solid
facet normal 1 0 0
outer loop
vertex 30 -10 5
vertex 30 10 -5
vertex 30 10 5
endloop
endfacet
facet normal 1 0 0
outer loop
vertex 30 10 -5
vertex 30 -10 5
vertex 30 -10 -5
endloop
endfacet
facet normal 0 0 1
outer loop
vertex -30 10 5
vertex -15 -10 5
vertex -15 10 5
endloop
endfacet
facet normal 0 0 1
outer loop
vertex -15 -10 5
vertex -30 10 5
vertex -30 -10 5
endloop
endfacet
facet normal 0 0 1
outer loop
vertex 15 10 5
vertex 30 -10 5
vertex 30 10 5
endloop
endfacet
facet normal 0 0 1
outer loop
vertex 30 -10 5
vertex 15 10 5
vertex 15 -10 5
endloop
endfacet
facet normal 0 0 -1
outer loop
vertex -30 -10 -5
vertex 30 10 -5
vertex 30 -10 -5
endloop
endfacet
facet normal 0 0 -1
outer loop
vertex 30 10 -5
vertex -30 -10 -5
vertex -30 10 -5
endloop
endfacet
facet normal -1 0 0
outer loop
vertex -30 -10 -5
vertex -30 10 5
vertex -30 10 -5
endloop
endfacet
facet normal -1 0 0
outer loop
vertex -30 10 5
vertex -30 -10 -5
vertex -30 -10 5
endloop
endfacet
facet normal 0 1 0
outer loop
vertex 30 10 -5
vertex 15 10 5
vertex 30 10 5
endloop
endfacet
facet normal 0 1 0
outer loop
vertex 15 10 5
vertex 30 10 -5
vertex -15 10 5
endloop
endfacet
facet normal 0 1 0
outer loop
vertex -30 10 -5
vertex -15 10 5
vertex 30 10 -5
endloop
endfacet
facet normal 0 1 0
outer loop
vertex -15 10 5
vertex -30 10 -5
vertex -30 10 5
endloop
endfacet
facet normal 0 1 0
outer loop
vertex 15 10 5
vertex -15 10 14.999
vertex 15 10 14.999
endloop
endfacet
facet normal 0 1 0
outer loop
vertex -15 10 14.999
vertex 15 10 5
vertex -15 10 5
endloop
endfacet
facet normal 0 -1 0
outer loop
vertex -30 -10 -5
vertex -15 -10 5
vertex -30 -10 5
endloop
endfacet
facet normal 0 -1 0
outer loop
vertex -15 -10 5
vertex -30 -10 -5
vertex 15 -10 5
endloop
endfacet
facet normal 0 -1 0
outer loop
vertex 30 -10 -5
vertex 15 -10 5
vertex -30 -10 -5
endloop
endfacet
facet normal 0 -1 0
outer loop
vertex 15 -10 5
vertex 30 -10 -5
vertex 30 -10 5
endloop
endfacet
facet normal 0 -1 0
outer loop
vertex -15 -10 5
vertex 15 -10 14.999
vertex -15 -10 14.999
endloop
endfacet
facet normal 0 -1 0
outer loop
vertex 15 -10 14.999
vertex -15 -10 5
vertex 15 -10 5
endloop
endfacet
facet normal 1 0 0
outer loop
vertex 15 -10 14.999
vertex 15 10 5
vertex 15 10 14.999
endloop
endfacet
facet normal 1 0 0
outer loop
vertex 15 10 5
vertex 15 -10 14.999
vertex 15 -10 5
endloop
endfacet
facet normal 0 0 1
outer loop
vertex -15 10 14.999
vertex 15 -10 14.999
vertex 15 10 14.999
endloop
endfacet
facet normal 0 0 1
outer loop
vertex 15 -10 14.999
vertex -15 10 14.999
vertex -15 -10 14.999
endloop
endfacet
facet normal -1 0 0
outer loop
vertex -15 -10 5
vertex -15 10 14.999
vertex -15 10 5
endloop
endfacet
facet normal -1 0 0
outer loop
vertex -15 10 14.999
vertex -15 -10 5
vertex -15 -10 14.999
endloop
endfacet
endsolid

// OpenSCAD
// Chapter One

// https://openscad.org/documentation.html#tutorial
// https://en.wikibooks.org/wiki/OpenSCAD_Tutorial/Chapter_1


$fa = 1;
$fs = 0.4;

cube([60,20,10],center=true);
translate([0,0,10-0.001]) cube([30,20,10], center=true);
